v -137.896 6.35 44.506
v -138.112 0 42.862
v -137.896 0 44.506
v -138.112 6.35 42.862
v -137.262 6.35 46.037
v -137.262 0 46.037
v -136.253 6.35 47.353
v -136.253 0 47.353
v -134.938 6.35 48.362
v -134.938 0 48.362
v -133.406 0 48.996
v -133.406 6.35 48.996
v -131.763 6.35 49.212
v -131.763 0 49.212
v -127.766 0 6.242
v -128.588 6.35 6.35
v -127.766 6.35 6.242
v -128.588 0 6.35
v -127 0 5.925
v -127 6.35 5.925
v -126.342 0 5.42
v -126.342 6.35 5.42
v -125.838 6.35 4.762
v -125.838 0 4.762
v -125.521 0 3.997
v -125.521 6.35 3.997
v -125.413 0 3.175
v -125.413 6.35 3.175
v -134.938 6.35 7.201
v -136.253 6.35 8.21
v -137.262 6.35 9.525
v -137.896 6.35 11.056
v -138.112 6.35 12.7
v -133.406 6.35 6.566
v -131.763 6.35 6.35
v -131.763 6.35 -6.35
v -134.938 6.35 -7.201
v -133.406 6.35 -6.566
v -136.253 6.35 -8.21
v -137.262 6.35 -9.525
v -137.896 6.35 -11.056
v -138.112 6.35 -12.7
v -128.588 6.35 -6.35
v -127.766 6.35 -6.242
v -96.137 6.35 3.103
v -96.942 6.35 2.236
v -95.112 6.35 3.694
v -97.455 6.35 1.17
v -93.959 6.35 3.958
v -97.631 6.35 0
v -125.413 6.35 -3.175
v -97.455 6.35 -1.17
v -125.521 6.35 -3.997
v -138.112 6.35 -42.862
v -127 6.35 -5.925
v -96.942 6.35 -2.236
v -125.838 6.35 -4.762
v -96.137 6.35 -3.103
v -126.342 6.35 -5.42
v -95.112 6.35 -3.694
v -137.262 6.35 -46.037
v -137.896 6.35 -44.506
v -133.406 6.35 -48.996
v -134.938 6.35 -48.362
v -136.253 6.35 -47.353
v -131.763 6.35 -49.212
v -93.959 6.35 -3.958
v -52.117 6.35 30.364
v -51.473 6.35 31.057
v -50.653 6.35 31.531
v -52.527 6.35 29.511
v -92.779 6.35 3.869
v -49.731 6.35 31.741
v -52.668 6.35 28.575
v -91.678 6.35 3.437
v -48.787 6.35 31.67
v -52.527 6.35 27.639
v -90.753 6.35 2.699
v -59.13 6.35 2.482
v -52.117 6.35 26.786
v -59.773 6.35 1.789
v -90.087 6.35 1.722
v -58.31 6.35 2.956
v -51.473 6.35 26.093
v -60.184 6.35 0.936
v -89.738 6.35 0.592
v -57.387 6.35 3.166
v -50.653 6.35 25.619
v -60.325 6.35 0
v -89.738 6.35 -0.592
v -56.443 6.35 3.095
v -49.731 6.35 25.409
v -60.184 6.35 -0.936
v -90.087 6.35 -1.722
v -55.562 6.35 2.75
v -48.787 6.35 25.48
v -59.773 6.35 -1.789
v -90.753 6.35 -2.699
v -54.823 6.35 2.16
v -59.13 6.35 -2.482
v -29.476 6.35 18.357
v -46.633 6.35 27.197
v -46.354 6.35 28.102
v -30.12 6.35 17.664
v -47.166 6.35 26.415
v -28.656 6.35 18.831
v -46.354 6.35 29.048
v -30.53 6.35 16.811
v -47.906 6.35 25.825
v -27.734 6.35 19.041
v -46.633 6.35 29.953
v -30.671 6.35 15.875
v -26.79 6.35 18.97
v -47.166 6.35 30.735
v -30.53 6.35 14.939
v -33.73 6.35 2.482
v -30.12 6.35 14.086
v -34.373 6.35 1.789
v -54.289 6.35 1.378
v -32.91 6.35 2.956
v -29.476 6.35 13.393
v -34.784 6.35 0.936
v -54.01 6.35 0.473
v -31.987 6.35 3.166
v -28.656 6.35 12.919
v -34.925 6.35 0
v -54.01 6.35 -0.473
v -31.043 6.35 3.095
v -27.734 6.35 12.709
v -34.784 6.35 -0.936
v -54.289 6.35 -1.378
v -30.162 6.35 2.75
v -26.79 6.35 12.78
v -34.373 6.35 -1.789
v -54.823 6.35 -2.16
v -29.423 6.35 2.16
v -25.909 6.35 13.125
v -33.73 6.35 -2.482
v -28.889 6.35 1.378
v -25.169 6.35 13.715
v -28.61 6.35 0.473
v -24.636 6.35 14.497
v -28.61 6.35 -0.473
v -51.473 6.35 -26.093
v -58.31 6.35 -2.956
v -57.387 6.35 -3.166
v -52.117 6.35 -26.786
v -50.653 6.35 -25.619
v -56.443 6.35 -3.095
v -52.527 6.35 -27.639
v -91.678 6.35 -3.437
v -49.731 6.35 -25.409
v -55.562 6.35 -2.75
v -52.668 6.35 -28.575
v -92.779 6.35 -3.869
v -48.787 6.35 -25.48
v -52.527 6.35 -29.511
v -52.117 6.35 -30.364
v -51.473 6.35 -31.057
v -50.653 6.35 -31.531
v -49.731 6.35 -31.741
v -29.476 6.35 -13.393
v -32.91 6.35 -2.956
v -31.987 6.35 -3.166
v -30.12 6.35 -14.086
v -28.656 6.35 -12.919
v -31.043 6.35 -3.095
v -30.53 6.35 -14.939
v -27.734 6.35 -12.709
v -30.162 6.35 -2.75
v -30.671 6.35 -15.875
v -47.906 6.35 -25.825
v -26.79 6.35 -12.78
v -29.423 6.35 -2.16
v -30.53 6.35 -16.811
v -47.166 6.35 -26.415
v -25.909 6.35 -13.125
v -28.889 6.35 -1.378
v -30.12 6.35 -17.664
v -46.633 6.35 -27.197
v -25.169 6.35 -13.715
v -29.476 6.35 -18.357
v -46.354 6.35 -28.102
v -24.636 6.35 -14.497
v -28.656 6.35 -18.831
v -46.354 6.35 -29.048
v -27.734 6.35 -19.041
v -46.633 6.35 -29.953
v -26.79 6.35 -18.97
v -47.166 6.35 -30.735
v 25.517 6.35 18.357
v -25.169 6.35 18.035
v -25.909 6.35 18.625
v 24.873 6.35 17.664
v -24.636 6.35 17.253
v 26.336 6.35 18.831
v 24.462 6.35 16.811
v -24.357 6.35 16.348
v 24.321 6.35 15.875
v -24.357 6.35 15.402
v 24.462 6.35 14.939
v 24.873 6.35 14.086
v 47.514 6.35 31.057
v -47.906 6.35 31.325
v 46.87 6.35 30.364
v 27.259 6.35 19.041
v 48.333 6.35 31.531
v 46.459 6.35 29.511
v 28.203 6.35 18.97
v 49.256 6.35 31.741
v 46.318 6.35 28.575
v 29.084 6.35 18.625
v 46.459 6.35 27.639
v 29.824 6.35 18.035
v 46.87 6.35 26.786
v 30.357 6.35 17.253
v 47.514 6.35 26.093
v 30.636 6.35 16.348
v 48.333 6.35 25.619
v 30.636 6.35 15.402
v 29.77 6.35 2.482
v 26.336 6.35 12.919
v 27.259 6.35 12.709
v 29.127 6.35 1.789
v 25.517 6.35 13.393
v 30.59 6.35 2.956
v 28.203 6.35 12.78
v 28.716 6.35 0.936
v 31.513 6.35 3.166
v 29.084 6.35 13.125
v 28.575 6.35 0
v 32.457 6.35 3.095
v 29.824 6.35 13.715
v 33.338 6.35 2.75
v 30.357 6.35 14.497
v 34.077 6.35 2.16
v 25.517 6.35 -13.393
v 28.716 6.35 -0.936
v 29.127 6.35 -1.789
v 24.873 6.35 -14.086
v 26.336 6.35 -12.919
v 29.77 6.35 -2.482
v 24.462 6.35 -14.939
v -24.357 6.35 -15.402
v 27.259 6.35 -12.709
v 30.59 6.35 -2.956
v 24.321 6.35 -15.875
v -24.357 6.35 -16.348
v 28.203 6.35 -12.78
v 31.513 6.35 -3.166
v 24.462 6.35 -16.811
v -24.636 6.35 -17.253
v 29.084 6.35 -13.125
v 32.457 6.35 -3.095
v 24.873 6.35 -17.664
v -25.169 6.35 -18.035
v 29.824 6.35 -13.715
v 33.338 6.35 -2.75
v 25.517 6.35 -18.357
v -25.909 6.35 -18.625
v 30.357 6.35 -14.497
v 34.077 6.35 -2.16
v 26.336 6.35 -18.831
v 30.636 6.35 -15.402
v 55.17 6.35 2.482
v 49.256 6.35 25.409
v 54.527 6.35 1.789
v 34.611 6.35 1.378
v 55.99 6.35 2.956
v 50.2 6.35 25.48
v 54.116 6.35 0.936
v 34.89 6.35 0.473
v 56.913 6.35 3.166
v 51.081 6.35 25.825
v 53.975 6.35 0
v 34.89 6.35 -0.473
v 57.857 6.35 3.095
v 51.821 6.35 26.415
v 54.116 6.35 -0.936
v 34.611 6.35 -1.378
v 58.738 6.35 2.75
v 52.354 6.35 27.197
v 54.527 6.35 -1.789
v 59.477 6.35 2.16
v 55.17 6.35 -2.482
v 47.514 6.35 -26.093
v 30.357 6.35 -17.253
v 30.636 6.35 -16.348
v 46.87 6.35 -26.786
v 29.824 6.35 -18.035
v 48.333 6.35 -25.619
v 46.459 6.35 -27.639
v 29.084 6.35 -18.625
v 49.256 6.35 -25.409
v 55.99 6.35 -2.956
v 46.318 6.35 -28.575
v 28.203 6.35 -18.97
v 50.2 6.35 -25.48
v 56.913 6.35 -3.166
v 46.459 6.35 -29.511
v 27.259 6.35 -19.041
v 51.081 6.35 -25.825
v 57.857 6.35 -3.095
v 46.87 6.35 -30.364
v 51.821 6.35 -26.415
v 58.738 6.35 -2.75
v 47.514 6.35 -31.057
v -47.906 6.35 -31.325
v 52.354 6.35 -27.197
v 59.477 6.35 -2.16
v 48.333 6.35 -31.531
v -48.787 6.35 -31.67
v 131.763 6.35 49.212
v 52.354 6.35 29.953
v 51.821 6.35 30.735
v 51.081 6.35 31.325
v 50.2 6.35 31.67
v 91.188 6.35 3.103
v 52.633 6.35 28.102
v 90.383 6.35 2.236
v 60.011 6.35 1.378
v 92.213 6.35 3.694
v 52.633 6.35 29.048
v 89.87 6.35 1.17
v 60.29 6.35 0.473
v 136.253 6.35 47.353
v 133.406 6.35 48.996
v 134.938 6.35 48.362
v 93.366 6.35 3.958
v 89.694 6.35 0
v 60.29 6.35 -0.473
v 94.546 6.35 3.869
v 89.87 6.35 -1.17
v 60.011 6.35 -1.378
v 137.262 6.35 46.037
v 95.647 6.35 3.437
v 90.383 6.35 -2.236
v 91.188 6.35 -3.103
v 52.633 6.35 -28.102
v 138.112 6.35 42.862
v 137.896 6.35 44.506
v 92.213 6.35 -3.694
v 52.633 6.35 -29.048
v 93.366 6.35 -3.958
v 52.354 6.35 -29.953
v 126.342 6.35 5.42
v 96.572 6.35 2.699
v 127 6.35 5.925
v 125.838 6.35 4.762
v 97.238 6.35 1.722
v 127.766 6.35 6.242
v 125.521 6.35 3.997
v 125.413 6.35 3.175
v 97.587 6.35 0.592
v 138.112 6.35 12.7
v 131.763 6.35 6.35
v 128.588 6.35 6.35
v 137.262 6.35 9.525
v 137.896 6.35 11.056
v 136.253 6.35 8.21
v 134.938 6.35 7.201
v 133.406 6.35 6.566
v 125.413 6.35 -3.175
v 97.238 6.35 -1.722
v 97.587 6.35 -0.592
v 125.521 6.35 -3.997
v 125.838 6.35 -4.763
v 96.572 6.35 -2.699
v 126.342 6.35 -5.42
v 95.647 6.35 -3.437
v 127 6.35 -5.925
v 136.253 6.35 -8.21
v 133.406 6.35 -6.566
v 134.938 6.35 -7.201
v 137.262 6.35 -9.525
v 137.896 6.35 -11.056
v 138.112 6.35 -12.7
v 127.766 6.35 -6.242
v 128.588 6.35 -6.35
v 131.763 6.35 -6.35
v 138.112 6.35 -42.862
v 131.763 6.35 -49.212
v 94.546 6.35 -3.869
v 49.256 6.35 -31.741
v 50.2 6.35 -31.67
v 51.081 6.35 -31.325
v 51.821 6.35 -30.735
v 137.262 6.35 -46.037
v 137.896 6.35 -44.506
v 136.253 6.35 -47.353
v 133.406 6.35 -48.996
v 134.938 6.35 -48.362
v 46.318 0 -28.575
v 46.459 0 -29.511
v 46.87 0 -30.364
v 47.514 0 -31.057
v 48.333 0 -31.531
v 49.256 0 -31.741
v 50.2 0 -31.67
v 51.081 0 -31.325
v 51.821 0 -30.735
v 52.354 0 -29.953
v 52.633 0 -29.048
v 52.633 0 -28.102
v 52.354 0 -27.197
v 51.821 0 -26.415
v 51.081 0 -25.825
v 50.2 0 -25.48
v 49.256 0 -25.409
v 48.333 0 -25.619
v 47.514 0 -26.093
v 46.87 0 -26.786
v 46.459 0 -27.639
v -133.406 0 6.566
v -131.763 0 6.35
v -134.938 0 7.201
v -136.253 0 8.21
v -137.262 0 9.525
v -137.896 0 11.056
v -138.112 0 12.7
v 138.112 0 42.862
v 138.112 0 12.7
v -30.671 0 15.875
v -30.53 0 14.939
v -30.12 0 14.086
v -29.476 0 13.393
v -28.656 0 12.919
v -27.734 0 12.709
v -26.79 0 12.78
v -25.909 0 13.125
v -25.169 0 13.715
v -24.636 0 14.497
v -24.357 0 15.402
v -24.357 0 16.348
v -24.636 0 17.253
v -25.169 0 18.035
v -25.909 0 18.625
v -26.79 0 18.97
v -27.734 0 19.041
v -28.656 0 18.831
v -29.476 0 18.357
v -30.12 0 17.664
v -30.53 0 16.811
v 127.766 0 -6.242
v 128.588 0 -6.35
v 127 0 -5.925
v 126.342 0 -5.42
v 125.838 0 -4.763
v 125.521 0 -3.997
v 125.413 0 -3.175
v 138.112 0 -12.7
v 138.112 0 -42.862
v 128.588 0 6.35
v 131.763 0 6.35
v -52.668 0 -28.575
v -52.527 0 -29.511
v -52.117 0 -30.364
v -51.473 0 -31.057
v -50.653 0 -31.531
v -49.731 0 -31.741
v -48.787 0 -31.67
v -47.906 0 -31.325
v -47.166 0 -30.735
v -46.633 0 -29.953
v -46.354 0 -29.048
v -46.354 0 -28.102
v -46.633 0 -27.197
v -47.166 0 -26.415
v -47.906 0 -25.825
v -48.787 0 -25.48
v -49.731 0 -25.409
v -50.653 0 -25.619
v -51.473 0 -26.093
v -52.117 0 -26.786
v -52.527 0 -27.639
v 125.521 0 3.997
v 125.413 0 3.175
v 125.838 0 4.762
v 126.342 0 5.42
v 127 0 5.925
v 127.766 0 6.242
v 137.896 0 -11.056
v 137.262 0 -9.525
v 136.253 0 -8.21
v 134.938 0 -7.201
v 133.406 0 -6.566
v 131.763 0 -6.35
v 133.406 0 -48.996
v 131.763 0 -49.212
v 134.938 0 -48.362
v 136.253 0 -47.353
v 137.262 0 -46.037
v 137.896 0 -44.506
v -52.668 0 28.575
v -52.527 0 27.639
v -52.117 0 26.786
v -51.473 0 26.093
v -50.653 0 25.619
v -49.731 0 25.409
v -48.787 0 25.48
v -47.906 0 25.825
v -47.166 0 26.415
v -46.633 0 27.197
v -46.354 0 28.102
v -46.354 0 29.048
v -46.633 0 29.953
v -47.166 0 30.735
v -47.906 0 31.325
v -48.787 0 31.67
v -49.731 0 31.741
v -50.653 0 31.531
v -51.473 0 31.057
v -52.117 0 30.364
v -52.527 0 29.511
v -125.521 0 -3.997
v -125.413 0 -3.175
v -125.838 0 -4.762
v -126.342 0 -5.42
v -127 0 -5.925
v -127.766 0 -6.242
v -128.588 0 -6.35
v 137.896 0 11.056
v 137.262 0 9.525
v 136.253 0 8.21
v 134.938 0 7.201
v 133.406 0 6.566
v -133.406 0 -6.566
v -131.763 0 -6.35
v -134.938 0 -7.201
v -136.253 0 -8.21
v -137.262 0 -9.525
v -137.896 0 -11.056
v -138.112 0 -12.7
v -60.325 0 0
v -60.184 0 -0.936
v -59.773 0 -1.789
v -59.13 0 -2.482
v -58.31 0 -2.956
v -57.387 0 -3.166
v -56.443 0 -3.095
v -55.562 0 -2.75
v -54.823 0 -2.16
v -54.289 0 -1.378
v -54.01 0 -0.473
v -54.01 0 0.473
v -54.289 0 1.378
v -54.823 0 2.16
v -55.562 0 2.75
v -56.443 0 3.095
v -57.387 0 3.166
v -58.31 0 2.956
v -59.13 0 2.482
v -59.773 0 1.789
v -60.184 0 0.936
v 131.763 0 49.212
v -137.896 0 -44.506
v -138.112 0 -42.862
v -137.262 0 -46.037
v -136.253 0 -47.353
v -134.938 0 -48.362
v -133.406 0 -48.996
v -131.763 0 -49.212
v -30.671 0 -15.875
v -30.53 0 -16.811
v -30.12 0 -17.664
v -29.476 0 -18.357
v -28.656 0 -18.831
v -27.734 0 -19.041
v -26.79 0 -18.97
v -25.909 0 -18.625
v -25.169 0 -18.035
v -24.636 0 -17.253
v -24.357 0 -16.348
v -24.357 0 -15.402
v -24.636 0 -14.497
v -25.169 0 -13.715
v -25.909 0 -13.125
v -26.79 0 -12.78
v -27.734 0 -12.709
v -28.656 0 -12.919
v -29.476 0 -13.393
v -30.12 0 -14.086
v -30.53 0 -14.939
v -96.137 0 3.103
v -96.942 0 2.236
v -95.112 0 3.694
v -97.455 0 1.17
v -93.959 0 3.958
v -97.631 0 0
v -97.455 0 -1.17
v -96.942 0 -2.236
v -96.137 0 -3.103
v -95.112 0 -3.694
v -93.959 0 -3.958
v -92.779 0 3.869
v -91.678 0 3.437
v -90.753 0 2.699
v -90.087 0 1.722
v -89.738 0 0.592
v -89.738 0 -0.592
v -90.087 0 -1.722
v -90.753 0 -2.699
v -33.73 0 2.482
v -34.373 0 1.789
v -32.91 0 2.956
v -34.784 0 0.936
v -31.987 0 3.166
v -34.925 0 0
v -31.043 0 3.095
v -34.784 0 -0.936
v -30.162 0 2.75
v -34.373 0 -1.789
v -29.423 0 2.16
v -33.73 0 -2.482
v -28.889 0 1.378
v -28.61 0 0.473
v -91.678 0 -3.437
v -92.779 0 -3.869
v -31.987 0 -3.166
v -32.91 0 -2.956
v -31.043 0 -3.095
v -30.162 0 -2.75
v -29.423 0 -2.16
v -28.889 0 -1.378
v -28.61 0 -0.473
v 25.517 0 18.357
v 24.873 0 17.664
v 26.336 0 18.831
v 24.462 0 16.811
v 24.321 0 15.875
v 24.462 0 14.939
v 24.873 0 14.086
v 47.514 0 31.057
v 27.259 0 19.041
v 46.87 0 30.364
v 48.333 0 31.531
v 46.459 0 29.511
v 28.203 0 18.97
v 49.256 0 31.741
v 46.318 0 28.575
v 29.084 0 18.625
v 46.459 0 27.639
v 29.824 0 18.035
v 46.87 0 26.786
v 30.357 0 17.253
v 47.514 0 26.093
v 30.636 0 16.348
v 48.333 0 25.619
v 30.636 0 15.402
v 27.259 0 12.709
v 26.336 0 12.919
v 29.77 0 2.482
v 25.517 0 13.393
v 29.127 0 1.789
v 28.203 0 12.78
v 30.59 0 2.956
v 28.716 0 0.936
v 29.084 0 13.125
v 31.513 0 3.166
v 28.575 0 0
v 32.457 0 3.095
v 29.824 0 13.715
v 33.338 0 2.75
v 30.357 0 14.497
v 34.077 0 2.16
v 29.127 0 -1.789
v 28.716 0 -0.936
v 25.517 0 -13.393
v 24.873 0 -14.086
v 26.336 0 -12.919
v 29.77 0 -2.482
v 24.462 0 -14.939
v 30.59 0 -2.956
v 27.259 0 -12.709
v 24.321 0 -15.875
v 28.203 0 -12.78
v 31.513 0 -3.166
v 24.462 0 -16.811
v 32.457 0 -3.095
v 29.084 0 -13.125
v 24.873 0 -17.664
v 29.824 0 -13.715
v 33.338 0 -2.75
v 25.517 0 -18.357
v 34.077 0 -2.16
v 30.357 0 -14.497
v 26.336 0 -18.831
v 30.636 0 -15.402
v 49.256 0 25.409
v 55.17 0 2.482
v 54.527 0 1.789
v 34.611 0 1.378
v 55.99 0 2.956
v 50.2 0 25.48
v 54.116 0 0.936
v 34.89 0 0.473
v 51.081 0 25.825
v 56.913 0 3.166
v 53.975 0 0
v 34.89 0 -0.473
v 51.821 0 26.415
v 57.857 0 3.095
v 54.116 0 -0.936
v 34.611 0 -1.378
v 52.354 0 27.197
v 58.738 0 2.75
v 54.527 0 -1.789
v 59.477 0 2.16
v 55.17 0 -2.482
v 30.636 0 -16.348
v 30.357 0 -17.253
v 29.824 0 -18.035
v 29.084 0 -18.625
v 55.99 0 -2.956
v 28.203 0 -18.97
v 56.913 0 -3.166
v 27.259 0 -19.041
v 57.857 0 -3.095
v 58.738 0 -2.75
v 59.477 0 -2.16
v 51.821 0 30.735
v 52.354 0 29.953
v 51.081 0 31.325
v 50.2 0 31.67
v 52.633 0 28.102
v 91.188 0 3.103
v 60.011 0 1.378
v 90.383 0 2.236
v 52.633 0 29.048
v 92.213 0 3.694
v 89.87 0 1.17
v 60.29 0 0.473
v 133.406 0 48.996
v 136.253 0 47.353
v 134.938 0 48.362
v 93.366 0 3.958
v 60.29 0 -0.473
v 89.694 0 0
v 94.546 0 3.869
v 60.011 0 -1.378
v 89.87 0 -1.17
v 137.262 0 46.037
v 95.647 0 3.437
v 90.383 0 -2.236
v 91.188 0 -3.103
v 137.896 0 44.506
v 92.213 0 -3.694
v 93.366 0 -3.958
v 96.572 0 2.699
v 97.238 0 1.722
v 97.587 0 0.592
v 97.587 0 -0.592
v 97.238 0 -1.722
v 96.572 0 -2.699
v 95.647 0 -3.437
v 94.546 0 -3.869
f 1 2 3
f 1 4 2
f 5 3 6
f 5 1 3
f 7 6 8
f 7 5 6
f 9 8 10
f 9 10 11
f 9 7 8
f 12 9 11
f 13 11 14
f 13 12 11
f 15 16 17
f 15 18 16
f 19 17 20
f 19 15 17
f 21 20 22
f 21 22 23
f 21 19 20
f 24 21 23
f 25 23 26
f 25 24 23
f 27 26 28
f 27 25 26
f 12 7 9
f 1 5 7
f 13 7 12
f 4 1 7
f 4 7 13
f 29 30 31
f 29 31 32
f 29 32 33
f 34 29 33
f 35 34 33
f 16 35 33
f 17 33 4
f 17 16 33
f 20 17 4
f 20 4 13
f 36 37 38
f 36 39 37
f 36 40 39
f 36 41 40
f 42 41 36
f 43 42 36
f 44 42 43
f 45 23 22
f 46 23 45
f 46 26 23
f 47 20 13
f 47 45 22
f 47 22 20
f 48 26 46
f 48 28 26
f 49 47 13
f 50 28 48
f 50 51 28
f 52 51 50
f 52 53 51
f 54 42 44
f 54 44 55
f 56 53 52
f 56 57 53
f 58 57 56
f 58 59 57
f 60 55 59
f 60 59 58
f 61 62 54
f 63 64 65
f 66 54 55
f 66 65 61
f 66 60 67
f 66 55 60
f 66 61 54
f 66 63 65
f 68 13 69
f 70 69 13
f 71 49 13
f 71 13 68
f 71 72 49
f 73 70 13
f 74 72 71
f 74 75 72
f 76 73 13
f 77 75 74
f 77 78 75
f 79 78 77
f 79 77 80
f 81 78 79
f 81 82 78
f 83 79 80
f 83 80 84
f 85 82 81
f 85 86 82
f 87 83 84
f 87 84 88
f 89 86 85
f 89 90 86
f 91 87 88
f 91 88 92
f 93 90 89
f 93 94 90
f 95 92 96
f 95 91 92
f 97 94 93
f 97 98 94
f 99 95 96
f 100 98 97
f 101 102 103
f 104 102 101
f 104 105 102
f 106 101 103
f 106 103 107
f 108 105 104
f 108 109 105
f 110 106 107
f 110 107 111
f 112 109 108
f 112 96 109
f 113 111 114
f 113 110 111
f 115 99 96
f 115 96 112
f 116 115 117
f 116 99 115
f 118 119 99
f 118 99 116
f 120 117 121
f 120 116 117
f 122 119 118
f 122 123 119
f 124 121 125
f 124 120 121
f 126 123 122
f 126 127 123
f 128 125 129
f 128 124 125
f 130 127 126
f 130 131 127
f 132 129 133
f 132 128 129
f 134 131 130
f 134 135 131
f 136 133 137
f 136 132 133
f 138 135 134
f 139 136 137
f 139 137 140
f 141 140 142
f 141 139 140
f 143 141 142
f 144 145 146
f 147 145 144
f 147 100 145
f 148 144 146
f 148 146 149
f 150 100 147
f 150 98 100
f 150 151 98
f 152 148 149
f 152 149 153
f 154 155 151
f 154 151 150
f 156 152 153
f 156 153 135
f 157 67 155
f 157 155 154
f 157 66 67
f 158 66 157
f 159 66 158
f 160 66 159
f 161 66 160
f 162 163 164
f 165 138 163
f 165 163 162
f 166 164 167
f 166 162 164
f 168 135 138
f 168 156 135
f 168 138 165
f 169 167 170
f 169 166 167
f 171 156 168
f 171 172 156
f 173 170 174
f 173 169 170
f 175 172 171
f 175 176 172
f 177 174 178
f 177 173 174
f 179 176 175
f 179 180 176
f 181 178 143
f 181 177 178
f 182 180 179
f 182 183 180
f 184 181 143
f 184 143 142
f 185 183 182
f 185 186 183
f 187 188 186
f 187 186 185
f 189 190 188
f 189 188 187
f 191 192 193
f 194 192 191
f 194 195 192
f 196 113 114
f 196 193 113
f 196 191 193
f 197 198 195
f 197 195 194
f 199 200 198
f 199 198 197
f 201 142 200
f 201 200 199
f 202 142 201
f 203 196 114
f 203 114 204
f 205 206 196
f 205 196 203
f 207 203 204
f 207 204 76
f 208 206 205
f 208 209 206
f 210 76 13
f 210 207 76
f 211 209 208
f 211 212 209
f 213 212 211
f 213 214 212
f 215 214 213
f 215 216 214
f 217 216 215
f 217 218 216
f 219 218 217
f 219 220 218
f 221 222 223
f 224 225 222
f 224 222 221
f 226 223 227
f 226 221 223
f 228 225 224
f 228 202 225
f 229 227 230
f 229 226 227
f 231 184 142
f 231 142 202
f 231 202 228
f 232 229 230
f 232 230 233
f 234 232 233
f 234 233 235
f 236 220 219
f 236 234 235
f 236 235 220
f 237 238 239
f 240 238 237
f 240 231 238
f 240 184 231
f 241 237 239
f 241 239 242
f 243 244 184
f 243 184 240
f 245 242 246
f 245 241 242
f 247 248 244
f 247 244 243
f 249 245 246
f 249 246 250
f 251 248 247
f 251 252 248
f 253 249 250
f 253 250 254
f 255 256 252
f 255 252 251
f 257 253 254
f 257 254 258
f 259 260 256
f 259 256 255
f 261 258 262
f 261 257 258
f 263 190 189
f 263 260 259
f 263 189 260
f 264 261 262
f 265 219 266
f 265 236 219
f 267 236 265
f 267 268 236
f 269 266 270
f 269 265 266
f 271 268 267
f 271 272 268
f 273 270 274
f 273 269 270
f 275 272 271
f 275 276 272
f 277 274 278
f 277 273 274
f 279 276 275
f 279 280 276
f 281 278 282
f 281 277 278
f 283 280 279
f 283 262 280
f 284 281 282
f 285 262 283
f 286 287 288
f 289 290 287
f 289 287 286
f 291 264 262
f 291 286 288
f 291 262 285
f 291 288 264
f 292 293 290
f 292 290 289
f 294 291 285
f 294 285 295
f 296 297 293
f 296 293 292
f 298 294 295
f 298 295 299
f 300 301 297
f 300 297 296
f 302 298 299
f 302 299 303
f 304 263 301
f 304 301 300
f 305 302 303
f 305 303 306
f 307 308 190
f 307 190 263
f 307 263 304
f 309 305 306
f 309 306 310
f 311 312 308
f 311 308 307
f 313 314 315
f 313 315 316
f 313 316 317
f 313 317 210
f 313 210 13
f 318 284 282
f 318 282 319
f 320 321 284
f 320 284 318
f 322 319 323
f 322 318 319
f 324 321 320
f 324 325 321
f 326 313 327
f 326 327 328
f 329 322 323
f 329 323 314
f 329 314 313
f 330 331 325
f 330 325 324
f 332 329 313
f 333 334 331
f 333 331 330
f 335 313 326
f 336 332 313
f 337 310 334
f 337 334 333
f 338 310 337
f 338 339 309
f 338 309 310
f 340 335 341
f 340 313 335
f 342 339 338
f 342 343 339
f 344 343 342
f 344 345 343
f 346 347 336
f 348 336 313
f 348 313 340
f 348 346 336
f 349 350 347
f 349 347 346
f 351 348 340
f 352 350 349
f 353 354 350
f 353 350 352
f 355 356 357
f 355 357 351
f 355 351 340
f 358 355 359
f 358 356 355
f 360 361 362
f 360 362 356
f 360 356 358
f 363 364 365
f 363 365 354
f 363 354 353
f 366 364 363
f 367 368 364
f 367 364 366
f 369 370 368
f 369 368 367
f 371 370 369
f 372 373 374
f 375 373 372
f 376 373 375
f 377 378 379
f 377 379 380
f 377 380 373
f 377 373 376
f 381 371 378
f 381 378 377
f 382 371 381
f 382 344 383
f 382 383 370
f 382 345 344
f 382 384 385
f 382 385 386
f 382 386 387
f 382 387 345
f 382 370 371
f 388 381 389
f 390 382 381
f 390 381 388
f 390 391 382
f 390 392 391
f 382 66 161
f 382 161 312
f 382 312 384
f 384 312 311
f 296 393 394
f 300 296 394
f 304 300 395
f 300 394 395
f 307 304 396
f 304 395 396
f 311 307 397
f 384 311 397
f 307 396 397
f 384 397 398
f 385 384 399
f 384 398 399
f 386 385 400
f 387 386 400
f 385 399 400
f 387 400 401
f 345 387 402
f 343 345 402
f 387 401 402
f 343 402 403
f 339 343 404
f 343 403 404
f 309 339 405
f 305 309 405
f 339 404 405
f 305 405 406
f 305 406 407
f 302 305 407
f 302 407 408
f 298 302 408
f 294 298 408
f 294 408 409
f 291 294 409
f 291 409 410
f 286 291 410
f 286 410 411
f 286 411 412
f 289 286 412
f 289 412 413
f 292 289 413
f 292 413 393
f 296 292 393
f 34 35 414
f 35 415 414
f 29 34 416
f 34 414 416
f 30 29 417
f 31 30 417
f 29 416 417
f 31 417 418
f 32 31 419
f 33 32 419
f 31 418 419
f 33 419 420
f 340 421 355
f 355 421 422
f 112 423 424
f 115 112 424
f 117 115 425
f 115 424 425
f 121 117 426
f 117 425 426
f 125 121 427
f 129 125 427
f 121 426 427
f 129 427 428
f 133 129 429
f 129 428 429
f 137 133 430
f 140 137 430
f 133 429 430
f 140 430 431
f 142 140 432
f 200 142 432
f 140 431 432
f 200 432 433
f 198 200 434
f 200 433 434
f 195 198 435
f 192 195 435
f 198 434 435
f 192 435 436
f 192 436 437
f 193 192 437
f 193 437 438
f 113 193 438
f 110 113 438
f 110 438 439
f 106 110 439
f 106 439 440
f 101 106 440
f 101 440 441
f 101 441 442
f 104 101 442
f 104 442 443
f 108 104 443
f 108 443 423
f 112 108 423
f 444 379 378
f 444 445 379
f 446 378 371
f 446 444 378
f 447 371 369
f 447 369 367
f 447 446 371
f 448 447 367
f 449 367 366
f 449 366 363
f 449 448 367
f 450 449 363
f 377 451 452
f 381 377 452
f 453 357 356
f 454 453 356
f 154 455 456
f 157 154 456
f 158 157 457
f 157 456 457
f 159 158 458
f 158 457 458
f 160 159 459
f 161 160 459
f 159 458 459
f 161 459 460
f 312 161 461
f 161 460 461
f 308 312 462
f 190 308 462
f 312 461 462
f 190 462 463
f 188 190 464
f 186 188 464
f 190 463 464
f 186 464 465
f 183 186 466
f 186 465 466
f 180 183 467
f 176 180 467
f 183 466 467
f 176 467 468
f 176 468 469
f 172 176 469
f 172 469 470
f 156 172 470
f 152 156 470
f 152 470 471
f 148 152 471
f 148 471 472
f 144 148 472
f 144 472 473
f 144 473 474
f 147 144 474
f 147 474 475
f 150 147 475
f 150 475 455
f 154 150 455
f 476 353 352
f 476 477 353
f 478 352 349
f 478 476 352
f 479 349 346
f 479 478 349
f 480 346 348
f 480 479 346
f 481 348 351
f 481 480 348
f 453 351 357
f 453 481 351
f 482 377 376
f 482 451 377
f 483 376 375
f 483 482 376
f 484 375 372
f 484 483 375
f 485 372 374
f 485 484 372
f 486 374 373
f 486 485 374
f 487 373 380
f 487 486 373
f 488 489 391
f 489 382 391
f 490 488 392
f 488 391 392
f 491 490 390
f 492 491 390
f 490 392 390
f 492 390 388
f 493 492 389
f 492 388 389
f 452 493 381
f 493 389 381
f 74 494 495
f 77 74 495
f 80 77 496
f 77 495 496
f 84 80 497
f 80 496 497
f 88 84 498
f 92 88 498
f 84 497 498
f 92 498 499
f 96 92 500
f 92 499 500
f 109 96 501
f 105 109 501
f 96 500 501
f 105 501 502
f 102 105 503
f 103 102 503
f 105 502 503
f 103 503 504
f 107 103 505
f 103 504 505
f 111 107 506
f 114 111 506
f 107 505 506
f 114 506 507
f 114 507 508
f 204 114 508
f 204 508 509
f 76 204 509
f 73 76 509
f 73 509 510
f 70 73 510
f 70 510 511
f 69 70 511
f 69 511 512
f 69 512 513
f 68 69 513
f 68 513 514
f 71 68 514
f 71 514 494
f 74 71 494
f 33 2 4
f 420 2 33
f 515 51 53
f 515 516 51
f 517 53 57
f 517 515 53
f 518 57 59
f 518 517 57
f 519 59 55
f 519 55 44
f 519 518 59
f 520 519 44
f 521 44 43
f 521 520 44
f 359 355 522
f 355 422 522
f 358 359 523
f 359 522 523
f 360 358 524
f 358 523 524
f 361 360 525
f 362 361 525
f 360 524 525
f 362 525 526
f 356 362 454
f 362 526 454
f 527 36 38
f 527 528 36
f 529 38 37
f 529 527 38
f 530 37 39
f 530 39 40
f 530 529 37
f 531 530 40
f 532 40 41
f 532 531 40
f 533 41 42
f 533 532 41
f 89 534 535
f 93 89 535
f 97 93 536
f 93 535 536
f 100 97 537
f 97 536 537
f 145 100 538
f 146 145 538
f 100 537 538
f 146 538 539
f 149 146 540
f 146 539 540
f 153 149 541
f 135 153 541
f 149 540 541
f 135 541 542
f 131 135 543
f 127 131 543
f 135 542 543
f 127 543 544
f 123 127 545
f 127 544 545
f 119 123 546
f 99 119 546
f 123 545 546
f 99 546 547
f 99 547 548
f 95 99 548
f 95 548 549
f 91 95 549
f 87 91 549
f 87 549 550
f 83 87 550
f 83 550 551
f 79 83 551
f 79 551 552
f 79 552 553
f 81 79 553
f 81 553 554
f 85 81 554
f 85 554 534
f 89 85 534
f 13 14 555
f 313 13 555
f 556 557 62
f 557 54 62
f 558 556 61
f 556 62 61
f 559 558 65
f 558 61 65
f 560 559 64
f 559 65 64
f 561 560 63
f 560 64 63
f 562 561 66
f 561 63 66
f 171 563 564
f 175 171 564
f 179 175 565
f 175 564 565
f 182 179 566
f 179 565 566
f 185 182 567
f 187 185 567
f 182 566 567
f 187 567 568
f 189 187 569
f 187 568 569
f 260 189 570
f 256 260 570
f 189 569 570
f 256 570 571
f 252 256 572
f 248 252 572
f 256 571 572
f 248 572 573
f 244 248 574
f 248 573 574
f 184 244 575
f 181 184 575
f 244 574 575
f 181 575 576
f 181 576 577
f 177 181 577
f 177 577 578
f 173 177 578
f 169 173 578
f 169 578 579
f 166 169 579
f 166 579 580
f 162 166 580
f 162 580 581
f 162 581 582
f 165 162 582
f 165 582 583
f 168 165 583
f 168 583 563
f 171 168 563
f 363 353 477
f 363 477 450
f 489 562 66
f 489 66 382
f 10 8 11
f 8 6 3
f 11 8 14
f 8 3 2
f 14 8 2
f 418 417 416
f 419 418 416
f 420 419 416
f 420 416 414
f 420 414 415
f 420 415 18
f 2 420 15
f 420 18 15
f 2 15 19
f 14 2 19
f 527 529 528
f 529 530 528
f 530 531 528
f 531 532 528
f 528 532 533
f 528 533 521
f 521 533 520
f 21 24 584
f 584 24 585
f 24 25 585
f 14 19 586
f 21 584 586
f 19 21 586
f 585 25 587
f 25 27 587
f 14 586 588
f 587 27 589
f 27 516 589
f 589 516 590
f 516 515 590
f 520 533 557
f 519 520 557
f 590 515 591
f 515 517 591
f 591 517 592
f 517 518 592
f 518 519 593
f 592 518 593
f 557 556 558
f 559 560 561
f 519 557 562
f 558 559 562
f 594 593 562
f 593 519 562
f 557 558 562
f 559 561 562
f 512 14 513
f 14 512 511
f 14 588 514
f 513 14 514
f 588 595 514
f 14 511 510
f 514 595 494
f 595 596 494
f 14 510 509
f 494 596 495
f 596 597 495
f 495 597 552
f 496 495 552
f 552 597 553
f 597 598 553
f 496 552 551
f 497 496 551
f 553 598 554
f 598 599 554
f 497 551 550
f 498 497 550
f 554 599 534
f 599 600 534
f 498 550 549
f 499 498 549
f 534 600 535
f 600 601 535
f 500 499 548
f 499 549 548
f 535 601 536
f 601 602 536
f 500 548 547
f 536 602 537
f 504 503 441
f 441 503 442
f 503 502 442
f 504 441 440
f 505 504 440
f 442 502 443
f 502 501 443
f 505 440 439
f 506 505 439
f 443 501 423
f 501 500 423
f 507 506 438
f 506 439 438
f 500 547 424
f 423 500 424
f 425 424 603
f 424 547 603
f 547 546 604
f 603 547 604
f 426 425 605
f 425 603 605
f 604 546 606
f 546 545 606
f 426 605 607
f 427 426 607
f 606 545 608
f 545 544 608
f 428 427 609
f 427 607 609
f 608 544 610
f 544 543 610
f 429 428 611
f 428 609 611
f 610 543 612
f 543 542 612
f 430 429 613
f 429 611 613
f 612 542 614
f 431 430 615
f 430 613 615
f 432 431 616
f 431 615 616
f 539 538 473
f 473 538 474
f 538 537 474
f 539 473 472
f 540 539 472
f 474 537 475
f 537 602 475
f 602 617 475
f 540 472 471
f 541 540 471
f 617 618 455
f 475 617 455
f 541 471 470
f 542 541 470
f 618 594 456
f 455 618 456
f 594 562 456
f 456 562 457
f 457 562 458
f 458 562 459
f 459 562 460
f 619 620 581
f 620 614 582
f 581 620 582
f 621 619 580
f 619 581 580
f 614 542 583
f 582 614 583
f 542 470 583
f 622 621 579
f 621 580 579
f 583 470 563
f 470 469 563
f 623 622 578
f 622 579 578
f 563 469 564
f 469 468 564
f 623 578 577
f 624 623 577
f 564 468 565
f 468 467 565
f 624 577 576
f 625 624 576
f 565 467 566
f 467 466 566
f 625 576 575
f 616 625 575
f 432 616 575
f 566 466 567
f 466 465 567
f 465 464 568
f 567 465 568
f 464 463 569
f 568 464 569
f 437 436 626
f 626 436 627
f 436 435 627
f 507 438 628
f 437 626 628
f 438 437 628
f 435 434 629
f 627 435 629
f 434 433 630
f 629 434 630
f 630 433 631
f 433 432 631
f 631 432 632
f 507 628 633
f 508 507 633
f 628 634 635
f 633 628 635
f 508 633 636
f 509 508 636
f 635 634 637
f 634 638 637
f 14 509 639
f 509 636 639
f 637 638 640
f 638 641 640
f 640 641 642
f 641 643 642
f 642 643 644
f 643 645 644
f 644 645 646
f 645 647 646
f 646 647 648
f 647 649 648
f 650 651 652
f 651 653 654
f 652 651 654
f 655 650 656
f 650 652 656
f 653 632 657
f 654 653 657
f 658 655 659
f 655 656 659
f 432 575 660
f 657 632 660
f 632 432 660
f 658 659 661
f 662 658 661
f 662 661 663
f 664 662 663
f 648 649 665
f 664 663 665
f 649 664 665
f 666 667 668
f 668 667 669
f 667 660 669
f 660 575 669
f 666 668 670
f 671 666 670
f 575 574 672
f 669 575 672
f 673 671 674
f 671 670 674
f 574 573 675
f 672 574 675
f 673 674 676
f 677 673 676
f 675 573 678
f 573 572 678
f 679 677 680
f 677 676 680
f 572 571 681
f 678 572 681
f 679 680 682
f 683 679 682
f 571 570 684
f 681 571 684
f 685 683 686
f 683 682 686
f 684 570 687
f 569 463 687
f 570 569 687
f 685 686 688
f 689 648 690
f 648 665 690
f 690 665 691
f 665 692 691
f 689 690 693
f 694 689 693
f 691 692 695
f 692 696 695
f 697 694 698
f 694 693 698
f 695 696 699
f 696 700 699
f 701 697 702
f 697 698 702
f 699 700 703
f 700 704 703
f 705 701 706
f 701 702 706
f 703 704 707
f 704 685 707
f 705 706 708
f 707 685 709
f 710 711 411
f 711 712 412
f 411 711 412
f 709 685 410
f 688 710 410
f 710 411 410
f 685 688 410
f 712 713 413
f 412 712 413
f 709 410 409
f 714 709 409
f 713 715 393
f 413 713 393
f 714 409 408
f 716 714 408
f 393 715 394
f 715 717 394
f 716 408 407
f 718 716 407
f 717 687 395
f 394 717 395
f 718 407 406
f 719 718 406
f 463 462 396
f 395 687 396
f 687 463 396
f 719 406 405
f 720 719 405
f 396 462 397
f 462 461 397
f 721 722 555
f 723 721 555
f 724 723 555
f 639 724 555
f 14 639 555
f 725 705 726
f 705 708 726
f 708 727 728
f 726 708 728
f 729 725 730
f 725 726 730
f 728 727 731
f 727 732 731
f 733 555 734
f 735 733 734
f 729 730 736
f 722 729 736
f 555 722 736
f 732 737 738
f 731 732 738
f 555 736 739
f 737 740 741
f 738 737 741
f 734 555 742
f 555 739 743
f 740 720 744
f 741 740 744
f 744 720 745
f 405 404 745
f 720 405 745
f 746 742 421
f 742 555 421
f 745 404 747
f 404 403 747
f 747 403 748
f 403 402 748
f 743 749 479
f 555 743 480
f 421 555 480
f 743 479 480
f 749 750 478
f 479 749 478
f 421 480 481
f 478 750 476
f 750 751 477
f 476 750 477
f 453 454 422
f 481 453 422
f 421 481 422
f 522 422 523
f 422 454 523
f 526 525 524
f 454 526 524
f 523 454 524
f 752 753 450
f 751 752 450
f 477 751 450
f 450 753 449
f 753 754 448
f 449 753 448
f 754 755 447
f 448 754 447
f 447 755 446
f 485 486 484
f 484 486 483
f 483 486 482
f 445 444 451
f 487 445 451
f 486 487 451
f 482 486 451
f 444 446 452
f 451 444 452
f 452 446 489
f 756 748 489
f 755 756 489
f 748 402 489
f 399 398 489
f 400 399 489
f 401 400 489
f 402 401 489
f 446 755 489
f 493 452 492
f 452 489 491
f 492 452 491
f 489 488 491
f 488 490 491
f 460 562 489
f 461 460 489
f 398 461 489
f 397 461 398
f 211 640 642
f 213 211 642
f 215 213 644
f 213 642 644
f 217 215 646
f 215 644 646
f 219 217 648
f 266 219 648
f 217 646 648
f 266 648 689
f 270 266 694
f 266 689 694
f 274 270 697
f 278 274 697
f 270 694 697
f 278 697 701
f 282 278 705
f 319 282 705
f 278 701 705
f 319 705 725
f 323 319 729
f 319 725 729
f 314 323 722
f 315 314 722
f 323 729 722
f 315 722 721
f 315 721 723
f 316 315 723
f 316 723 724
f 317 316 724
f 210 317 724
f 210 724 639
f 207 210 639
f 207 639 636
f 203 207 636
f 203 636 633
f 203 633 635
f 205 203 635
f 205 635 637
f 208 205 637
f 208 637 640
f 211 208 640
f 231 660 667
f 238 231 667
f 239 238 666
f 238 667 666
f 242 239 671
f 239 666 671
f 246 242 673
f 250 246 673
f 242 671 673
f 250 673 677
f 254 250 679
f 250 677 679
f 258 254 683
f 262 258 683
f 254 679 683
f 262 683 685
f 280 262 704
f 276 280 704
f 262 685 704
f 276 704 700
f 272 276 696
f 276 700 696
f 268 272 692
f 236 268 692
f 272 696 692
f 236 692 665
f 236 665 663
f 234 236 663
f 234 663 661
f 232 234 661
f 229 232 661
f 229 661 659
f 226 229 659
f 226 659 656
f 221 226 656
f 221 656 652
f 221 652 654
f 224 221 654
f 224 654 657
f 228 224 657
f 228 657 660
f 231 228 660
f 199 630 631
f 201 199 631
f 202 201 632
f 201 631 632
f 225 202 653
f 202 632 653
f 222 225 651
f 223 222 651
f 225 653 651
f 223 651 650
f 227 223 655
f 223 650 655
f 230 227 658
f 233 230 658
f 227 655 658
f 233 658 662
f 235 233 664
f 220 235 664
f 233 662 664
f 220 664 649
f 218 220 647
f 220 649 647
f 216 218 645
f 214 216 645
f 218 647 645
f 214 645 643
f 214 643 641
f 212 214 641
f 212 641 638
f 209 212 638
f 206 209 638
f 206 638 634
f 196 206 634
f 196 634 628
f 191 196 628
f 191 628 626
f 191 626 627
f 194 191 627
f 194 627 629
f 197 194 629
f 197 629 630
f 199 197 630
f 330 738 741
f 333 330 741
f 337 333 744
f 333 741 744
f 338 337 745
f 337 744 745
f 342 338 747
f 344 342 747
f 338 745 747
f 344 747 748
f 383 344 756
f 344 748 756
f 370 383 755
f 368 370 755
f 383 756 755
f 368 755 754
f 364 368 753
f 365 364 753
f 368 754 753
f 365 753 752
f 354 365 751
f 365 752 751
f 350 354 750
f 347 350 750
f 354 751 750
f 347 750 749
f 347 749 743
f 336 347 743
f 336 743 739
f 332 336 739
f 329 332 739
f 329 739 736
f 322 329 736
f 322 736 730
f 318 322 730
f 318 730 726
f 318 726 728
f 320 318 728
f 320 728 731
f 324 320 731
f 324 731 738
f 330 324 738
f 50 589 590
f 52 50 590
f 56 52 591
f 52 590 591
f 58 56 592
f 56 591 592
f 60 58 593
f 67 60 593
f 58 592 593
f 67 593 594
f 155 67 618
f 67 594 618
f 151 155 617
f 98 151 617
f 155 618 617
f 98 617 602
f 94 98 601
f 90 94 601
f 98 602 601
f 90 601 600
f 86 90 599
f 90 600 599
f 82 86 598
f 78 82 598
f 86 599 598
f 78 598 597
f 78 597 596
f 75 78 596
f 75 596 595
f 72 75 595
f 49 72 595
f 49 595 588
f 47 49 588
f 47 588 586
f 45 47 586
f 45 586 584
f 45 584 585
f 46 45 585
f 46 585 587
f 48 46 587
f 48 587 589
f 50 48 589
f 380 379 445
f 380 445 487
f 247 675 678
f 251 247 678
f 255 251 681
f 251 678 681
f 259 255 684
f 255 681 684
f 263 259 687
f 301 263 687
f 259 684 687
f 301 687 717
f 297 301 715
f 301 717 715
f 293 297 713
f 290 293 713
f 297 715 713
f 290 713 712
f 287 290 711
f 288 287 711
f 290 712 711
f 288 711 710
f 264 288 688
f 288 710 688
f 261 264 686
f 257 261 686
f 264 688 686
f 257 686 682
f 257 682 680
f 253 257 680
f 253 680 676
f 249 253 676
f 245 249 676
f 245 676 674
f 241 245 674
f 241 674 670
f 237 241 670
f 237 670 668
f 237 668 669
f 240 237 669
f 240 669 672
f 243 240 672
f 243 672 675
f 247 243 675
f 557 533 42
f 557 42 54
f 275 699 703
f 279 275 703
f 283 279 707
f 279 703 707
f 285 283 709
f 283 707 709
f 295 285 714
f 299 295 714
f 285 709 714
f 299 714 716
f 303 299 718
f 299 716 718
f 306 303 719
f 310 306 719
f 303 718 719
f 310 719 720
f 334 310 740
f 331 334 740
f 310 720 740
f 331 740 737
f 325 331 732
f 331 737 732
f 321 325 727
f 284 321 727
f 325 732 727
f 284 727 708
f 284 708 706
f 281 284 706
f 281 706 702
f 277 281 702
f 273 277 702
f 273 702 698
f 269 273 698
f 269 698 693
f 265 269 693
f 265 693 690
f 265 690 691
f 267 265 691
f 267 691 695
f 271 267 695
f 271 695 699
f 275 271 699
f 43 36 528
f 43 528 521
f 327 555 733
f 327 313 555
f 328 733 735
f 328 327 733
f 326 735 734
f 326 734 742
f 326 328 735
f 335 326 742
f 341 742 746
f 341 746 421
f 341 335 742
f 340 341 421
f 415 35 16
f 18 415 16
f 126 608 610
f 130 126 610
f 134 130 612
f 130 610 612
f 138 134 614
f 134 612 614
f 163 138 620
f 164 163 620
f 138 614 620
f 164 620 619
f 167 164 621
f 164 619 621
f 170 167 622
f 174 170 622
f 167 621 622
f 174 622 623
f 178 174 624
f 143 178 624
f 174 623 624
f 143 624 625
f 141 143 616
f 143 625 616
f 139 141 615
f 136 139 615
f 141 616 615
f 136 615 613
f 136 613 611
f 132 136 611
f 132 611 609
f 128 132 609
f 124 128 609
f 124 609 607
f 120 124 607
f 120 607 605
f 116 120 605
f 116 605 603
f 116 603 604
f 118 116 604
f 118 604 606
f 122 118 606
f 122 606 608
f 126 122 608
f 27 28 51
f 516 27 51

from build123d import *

# Parameters (mm, degrees)
SKETCH1_W                      = 276.225
SKETCH1_H                      = 98.425
BOSS_EXTRUDE1_DEPTH            = 6.35
F_5_16_0_332_DOWEL_HOLE1_D     = 7.9375
F_5_16_0_332_DOWEL_HOLE1_DEPTH = 6.35
SKETCH5_W                      = 12.7
SKETCH5_H                      = 12.7
CUT_EXTRUDE1_DEPTH             = 7.35
FILLET1_R                      = 3.175
FILLET2_R                      = 6.35
F_1_4_0_2500_DOWEL_HOLE1_D     = 6.35
F_1_4_0_2500_DOWEL_HOLE1_DEPTH = 6.35


with BuildPart() as part:
    # Sketch1 → Boss-Extrude1 (new body)
    with BuildSketch(Plane(origin=(0, 0, 0), x_dir=(1, 0, 0), z_dir=(0, 1, 0))):
        Rectangle(SKETCH1_W, SKETCH1_H)
    extrude(amount=BOSS_EXTRUDE1_DEPTH)

    # 5/16 (0.332) Dowel Hole1
    with Locations(Plane(origin=(0, 6.35, 0), x_dir=(1, 0, 0), z_dir=(0, 1, 0))):
        with Locations((-93.6625, 0), (93.6625, 0)):
            Hole(F_5_16_0_332_DOWEL_HOLE1_D / 2, depth=F_5_16_0_332_DOWEL_HOLE1_DEPTH)

    # Sketch5 → Cut-Extrude1 (cut, through all)
    with BuildSketch(Plane(origin=(0, 6.35, 0), x_dir=(1, 0, 0), z_dir=(0, 1, 0))):
        with Locations((-131.7625, 0)):
            Rectangle(SKETCH5_W, SKETCH5_H)
        with Locations((131.7625, 0)):
            Rectangle(SKETCH5_W, SKETCH5_H)
    extrude(amount=-CUT_EXTRUDE1_DEPTH, mode=Mode.SUBTRACT)

    # Fillet1
    fillet1_edges = [part.edges().sort_by_distance(p)[0] for p in [
        (-125.4125, 3.175, -6.35),
        (-125.4125, 3.175, 6.35),
        (125.4125, 3.175, 6.35),
        (125.4125, 3.175, -6.35),
    ]]
    fillet(fillet1_edges, radius=FILLET1_R)

    # Fillet2
    fillet2_edges = [part.edges().sort_by_distance(p)[0] for p in [
        (-138.1125, 3.175, 6.35),
        (-138.1125, 3.175, -6.35),
        (138.1125, 3.175, -6.35),
        (138.1125, 3.175, 6.35),
        (-138.1125, 3.175, -49.2125),
        (138.1125, 3.175, -49.2125),
        (138.1125, 3.175, 49.2125),
        (-138.1125, 3.175, 49.2125),
    ]]
    fillet(fillet2_edges, radius=FILLET2_R)

    # 1/4 (0.2500) Dowel Hole1
    with Locations(Plane(origin=(0, 6.35, 0), x_dir=(1, 0, 0), z_dir=(0, 1, 0))):
        with Locations((-57.15, 0), (-31.75, 0), (31.75, 0), (57.15, 0), (-49.493351826, 28.575), (-27.49630657, 15.875), (-27.49630657, -15.875), (-49.493351826, -28.575), (27.49630657, 15.875), (49.493351826, 28.575), (49.493351826, -28.575), (27.49630657, -15.875)):
            Hole(F_1_4_0_2500_DOWEL_HOLE1_D / 2, depth=F_1_4_0_2500_DOWEL_HOLE1_DEPTH)


solid = part.part
